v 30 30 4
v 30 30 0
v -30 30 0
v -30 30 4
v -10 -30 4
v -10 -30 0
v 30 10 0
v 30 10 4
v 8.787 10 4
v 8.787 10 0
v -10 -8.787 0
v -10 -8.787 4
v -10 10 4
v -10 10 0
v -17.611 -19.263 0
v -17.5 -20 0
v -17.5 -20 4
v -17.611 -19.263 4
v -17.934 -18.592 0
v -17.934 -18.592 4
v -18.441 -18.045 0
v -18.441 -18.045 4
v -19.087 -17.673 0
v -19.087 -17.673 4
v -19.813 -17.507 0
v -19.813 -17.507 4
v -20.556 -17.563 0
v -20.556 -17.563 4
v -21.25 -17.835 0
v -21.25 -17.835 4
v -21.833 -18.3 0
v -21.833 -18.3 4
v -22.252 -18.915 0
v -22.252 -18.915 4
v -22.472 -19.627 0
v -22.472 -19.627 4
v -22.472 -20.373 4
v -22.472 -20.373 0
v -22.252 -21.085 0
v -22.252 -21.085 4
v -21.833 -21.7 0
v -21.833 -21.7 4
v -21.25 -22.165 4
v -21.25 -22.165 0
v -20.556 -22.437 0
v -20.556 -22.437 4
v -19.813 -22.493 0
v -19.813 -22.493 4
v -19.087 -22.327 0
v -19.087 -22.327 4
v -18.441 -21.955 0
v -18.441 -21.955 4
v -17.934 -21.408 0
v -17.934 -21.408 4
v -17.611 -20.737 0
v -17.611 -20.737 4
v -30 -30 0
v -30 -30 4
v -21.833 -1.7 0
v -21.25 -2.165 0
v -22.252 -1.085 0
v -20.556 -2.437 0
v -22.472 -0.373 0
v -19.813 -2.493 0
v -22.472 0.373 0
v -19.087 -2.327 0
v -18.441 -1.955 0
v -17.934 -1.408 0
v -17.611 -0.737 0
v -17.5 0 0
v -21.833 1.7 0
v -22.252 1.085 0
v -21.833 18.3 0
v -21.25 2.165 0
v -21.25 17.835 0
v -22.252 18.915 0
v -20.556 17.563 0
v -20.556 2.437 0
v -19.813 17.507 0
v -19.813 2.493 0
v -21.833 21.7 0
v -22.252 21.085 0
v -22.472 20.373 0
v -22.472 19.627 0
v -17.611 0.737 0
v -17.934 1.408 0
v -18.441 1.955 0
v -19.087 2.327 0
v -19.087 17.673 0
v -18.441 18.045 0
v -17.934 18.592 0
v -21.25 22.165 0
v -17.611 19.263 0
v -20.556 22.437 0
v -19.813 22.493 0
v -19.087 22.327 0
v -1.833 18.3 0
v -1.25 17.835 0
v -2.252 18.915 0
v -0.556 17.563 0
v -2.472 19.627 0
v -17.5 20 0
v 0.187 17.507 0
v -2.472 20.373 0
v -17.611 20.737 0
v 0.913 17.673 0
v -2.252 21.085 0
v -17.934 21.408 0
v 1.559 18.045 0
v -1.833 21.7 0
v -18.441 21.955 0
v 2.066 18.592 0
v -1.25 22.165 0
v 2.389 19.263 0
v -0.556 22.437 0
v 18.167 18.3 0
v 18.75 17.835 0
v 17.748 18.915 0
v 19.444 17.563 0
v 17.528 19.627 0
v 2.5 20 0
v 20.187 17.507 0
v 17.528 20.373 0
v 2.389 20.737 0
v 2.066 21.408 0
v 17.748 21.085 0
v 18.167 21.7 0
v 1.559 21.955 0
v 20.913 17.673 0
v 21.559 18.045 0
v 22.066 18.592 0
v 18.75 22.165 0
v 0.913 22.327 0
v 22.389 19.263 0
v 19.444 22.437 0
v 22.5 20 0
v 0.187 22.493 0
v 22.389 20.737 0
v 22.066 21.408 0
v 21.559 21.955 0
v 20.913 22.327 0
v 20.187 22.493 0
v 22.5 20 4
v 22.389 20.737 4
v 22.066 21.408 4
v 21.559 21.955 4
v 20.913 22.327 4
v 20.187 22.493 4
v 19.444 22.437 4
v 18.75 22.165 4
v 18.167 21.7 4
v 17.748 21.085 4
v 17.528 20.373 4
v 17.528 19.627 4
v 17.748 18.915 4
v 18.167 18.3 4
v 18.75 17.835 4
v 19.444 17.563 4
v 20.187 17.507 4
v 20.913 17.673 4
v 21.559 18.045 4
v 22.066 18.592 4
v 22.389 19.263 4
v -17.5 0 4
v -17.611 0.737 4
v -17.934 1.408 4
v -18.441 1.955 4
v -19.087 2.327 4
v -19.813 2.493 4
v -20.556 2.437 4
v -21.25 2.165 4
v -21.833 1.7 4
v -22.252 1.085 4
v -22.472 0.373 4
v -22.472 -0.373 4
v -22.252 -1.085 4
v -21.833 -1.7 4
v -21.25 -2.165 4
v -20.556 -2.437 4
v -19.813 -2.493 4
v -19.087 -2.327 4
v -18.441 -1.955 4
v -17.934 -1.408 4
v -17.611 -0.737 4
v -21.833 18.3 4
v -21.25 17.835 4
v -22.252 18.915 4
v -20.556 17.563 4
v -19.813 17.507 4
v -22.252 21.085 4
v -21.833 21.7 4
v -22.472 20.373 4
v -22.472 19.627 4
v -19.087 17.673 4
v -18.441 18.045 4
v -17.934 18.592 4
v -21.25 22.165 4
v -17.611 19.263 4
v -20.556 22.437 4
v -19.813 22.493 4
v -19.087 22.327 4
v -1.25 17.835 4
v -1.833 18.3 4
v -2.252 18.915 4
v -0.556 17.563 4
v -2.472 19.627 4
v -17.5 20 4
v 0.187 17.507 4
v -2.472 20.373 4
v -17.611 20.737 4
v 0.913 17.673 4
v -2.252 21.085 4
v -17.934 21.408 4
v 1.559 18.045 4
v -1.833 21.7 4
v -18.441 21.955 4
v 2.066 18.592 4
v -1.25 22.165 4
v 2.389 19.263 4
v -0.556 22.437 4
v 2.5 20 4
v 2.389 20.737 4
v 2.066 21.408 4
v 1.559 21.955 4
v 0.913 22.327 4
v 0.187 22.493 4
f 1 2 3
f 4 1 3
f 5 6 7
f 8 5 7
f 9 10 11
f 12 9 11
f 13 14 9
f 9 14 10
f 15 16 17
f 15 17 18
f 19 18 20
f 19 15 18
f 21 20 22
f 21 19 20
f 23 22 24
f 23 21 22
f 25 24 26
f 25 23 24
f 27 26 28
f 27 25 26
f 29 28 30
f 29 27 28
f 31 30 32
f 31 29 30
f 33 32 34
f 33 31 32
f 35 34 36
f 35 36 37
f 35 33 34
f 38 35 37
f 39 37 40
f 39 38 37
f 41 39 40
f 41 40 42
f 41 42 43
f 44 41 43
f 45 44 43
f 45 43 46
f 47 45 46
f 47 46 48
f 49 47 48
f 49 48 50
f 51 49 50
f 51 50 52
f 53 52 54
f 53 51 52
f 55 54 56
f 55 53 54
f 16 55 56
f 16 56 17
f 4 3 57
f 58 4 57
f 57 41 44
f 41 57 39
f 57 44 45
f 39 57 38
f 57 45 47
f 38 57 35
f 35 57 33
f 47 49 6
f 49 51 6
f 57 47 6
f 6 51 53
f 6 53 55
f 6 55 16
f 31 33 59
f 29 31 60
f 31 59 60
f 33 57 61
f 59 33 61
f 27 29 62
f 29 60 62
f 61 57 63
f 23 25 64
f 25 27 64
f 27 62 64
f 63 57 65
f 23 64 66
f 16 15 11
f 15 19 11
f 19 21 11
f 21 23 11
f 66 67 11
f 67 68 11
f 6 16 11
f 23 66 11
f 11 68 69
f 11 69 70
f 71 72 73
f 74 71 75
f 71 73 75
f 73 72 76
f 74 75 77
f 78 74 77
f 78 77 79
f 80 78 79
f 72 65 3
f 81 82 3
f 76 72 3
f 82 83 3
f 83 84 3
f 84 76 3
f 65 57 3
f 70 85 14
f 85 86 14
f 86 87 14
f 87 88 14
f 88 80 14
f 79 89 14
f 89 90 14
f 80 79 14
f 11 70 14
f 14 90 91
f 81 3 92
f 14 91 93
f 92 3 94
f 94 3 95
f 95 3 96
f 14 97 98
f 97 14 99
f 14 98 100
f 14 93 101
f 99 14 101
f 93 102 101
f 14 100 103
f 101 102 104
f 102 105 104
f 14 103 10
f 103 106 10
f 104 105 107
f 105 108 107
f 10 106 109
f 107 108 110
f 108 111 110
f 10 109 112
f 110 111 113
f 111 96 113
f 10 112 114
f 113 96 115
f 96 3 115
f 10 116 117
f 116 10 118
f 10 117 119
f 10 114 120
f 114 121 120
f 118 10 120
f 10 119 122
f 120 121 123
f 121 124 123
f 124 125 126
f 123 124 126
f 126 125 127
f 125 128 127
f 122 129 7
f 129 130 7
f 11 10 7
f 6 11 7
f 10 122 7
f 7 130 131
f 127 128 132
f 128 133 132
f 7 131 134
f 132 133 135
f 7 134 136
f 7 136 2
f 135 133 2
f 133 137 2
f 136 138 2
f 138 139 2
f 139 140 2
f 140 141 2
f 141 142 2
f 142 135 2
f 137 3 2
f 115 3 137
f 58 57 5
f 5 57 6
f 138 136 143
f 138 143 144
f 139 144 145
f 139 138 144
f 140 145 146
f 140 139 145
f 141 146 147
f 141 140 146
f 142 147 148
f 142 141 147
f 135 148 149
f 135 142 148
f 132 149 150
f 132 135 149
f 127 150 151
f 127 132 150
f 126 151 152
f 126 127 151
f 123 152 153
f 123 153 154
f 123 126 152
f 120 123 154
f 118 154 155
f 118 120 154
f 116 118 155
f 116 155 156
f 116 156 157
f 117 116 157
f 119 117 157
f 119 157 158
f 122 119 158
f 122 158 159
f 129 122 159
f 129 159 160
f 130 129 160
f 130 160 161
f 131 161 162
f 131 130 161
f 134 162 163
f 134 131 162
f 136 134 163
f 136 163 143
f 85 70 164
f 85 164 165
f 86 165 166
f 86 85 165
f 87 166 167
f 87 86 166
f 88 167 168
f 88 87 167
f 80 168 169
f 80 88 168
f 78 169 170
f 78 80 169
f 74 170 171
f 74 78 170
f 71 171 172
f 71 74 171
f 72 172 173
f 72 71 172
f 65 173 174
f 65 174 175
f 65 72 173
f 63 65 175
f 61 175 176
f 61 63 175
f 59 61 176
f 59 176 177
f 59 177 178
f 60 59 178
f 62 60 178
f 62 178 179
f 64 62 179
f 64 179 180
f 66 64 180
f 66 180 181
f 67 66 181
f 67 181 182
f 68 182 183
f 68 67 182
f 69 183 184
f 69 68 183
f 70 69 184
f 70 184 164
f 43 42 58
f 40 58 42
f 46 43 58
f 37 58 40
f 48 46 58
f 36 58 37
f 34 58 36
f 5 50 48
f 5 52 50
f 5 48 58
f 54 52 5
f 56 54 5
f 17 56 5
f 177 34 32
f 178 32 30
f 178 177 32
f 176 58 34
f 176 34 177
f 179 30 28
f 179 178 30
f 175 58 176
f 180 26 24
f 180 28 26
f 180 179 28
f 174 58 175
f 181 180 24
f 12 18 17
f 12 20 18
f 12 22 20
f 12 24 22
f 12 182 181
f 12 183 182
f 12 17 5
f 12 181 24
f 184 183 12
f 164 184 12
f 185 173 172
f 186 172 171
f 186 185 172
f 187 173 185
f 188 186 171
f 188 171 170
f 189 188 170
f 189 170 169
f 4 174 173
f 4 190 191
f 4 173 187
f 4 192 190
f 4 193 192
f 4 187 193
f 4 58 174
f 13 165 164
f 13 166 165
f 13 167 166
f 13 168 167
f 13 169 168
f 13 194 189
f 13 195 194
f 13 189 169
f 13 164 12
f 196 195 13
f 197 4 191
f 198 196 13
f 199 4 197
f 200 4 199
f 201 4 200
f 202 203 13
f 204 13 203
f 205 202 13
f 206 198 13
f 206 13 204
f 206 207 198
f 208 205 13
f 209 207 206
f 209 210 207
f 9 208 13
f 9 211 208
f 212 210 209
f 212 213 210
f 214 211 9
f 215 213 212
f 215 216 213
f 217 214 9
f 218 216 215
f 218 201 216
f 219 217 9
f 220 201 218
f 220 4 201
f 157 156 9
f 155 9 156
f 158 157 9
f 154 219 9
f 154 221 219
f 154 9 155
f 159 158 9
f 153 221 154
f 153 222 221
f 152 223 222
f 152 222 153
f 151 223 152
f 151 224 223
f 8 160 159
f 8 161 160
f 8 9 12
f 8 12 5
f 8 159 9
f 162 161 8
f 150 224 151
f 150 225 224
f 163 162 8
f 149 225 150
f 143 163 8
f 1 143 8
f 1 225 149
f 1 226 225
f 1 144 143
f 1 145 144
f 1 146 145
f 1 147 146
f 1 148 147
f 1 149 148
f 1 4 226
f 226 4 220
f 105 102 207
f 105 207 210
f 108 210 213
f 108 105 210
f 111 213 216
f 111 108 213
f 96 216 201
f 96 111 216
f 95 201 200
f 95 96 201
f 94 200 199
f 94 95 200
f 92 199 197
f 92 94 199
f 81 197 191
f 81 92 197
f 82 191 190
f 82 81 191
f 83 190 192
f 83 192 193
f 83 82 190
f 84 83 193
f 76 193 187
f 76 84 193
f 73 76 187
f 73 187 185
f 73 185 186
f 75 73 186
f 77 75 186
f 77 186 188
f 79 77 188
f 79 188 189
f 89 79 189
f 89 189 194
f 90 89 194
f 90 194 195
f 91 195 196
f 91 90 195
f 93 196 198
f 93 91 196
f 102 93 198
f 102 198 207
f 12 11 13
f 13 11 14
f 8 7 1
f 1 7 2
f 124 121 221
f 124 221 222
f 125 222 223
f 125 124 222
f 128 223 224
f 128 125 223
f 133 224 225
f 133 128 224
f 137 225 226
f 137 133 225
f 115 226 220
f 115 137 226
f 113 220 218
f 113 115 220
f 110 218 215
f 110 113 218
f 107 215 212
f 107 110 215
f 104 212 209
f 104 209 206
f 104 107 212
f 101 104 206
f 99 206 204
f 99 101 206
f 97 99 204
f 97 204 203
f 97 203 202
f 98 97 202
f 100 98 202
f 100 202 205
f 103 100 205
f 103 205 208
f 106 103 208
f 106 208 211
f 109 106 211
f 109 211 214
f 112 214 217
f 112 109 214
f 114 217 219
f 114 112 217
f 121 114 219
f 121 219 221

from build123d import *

# Parameters (mm, degrees)
F0_R     = 2.5
F1_DEPTH = 4


with BuildPart() as f1:
    # F0 (on Top) → F1 (new body)
    with BuildSketch(Plane.XY):
        Polygon((30, 30), (-30, 30), (-30, -30), (-10, -30), (30, 10), align=None)
        with Locations((-20, -20)):
            Circle(F0_R, mode=Mode.SUBTRACT)
        with Locations((-20, 0)):
            Circle(F0_R, mode=Mode.SUBTRACT)
        Polygon((8.786797, 10), (-10, -8.786797), (-10, 10), align=None, mode=Mode.SUBTRACT)
        with Locations((-20, 20)):
            Circle(F0_R, mode=Mode.SUBTRACT)
        with Locations((0, 20)):
            Circle(F0_R, mode=Mode.SUBTRACT)
        with Locations((20, 20)):
            Circle(F0_R, mode=Mode.SUBTRACT)
    extrude(amount=F1_DEPTH)


solid = f1.part
